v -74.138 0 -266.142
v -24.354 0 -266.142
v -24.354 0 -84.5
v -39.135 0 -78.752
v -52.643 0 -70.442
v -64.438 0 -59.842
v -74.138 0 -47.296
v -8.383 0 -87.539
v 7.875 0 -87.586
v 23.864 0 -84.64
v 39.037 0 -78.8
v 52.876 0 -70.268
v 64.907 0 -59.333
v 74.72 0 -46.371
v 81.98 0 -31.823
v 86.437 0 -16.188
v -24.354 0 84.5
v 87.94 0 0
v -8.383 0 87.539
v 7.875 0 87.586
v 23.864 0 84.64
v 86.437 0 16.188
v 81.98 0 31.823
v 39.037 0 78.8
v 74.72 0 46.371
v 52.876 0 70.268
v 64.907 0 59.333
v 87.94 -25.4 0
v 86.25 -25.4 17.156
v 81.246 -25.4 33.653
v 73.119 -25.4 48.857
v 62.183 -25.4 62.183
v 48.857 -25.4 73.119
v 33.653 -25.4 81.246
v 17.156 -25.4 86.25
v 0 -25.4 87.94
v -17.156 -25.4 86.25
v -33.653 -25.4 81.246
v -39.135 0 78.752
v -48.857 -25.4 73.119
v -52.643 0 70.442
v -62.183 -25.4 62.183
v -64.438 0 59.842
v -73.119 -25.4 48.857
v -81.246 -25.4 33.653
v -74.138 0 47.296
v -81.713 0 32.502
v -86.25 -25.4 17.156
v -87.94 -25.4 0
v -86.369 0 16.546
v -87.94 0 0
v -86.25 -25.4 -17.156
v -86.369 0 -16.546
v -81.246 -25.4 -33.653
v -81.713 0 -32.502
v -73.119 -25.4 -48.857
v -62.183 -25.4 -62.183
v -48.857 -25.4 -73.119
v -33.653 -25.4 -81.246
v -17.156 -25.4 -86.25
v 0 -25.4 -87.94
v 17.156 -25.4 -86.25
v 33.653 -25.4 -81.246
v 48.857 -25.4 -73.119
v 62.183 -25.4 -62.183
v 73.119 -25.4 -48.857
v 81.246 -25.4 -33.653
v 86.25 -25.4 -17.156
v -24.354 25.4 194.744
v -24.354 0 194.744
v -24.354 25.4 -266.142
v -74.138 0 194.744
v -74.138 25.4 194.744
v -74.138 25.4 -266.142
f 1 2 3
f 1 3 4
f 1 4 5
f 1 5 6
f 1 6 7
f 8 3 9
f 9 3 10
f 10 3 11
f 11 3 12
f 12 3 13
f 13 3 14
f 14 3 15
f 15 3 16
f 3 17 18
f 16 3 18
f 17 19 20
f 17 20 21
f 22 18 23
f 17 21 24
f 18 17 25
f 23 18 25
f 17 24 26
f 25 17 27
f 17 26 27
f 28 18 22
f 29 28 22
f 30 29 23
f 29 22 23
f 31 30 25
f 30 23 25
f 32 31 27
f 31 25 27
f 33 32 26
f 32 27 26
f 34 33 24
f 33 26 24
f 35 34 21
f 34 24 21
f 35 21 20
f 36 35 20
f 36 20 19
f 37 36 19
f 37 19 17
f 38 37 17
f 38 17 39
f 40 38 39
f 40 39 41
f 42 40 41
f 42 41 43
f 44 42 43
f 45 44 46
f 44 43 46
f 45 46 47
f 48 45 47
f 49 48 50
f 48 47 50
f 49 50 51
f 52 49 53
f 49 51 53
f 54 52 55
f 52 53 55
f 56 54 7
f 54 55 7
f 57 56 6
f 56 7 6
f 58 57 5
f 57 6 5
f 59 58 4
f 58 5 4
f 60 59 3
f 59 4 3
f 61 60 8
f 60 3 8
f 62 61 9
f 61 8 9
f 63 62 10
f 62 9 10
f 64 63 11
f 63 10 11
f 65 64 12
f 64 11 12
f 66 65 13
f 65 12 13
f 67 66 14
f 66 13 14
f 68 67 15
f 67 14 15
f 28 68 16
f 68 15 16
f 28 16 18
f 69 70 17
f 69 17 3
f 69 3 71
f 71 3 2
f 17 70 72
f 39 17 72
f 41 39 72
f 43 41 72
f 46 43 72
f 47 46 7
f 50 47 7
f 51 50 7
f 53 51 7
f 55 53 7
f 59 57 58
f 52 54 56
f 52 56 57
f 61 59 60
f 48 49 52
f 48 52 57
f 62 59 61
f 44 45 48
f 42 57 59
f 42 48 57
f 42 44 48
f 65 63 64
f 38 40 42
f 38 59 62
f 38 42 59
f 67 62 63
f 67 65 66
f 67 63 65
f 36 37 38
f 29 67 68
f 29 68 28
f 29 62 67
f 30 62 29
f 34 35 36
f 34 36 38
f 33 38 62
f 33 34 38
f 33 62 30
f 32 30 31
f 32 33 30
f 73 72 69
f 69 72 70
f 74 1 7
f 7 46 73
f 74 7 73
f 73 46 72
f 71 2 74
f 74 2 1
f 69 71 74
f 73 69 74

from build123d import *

# Parameters (mm, degrees)
F0_R     = 87.939634
F1_DEPTH = 25.4
F2_W     = 49.783926
F2_H     = 460.88621
F3_DEPTH = 25.4


with BuildPart() as f1:
    # F0 (on Front) → F1 (new body)
    with BuildSketch(Plane.XZ):
        Circle(F0_R)
    extrude(amount=F1_DEPTH)

    # F2 (on face) → F3 (join)
    with BuildSketch(Plane(origin=(0, 0, 0), x_dir=(-1, 0, 0), z_dir=(0, 1, 0))):
        with BuildLine():
            Line((74.138304, 194.744006), (24.354378, 194.744006))
            Line((24.354378, 194.744006), (24.354378, 84.499962))
            ThreePointArc((24.354378, 84.499962), (52.642567, 70.442454), (74.138304, 47.295783))
            Line((74.138304, 47.295783), (74.138304, 194.744006))
        make_face()
        with BuildLine():
            ThreePointArc((74.138304, -47.295783), (52.642567, -70.442454), (24.354378, -84.499962))
            Line((24.354378, -84.499962), (24.354378, -266.142204))
            Line((24.354378, -266.142204), (74.138304, -266.142204))
            Line((74.138304, -266.142204), (74.138304, -47.295783))
        make_face()
        with Locations((49.246341, -35.699099)):
            Rectangle(F2_W, F2_H)
    extrude(amount=F3_DEPTH)


solid = f1.part
